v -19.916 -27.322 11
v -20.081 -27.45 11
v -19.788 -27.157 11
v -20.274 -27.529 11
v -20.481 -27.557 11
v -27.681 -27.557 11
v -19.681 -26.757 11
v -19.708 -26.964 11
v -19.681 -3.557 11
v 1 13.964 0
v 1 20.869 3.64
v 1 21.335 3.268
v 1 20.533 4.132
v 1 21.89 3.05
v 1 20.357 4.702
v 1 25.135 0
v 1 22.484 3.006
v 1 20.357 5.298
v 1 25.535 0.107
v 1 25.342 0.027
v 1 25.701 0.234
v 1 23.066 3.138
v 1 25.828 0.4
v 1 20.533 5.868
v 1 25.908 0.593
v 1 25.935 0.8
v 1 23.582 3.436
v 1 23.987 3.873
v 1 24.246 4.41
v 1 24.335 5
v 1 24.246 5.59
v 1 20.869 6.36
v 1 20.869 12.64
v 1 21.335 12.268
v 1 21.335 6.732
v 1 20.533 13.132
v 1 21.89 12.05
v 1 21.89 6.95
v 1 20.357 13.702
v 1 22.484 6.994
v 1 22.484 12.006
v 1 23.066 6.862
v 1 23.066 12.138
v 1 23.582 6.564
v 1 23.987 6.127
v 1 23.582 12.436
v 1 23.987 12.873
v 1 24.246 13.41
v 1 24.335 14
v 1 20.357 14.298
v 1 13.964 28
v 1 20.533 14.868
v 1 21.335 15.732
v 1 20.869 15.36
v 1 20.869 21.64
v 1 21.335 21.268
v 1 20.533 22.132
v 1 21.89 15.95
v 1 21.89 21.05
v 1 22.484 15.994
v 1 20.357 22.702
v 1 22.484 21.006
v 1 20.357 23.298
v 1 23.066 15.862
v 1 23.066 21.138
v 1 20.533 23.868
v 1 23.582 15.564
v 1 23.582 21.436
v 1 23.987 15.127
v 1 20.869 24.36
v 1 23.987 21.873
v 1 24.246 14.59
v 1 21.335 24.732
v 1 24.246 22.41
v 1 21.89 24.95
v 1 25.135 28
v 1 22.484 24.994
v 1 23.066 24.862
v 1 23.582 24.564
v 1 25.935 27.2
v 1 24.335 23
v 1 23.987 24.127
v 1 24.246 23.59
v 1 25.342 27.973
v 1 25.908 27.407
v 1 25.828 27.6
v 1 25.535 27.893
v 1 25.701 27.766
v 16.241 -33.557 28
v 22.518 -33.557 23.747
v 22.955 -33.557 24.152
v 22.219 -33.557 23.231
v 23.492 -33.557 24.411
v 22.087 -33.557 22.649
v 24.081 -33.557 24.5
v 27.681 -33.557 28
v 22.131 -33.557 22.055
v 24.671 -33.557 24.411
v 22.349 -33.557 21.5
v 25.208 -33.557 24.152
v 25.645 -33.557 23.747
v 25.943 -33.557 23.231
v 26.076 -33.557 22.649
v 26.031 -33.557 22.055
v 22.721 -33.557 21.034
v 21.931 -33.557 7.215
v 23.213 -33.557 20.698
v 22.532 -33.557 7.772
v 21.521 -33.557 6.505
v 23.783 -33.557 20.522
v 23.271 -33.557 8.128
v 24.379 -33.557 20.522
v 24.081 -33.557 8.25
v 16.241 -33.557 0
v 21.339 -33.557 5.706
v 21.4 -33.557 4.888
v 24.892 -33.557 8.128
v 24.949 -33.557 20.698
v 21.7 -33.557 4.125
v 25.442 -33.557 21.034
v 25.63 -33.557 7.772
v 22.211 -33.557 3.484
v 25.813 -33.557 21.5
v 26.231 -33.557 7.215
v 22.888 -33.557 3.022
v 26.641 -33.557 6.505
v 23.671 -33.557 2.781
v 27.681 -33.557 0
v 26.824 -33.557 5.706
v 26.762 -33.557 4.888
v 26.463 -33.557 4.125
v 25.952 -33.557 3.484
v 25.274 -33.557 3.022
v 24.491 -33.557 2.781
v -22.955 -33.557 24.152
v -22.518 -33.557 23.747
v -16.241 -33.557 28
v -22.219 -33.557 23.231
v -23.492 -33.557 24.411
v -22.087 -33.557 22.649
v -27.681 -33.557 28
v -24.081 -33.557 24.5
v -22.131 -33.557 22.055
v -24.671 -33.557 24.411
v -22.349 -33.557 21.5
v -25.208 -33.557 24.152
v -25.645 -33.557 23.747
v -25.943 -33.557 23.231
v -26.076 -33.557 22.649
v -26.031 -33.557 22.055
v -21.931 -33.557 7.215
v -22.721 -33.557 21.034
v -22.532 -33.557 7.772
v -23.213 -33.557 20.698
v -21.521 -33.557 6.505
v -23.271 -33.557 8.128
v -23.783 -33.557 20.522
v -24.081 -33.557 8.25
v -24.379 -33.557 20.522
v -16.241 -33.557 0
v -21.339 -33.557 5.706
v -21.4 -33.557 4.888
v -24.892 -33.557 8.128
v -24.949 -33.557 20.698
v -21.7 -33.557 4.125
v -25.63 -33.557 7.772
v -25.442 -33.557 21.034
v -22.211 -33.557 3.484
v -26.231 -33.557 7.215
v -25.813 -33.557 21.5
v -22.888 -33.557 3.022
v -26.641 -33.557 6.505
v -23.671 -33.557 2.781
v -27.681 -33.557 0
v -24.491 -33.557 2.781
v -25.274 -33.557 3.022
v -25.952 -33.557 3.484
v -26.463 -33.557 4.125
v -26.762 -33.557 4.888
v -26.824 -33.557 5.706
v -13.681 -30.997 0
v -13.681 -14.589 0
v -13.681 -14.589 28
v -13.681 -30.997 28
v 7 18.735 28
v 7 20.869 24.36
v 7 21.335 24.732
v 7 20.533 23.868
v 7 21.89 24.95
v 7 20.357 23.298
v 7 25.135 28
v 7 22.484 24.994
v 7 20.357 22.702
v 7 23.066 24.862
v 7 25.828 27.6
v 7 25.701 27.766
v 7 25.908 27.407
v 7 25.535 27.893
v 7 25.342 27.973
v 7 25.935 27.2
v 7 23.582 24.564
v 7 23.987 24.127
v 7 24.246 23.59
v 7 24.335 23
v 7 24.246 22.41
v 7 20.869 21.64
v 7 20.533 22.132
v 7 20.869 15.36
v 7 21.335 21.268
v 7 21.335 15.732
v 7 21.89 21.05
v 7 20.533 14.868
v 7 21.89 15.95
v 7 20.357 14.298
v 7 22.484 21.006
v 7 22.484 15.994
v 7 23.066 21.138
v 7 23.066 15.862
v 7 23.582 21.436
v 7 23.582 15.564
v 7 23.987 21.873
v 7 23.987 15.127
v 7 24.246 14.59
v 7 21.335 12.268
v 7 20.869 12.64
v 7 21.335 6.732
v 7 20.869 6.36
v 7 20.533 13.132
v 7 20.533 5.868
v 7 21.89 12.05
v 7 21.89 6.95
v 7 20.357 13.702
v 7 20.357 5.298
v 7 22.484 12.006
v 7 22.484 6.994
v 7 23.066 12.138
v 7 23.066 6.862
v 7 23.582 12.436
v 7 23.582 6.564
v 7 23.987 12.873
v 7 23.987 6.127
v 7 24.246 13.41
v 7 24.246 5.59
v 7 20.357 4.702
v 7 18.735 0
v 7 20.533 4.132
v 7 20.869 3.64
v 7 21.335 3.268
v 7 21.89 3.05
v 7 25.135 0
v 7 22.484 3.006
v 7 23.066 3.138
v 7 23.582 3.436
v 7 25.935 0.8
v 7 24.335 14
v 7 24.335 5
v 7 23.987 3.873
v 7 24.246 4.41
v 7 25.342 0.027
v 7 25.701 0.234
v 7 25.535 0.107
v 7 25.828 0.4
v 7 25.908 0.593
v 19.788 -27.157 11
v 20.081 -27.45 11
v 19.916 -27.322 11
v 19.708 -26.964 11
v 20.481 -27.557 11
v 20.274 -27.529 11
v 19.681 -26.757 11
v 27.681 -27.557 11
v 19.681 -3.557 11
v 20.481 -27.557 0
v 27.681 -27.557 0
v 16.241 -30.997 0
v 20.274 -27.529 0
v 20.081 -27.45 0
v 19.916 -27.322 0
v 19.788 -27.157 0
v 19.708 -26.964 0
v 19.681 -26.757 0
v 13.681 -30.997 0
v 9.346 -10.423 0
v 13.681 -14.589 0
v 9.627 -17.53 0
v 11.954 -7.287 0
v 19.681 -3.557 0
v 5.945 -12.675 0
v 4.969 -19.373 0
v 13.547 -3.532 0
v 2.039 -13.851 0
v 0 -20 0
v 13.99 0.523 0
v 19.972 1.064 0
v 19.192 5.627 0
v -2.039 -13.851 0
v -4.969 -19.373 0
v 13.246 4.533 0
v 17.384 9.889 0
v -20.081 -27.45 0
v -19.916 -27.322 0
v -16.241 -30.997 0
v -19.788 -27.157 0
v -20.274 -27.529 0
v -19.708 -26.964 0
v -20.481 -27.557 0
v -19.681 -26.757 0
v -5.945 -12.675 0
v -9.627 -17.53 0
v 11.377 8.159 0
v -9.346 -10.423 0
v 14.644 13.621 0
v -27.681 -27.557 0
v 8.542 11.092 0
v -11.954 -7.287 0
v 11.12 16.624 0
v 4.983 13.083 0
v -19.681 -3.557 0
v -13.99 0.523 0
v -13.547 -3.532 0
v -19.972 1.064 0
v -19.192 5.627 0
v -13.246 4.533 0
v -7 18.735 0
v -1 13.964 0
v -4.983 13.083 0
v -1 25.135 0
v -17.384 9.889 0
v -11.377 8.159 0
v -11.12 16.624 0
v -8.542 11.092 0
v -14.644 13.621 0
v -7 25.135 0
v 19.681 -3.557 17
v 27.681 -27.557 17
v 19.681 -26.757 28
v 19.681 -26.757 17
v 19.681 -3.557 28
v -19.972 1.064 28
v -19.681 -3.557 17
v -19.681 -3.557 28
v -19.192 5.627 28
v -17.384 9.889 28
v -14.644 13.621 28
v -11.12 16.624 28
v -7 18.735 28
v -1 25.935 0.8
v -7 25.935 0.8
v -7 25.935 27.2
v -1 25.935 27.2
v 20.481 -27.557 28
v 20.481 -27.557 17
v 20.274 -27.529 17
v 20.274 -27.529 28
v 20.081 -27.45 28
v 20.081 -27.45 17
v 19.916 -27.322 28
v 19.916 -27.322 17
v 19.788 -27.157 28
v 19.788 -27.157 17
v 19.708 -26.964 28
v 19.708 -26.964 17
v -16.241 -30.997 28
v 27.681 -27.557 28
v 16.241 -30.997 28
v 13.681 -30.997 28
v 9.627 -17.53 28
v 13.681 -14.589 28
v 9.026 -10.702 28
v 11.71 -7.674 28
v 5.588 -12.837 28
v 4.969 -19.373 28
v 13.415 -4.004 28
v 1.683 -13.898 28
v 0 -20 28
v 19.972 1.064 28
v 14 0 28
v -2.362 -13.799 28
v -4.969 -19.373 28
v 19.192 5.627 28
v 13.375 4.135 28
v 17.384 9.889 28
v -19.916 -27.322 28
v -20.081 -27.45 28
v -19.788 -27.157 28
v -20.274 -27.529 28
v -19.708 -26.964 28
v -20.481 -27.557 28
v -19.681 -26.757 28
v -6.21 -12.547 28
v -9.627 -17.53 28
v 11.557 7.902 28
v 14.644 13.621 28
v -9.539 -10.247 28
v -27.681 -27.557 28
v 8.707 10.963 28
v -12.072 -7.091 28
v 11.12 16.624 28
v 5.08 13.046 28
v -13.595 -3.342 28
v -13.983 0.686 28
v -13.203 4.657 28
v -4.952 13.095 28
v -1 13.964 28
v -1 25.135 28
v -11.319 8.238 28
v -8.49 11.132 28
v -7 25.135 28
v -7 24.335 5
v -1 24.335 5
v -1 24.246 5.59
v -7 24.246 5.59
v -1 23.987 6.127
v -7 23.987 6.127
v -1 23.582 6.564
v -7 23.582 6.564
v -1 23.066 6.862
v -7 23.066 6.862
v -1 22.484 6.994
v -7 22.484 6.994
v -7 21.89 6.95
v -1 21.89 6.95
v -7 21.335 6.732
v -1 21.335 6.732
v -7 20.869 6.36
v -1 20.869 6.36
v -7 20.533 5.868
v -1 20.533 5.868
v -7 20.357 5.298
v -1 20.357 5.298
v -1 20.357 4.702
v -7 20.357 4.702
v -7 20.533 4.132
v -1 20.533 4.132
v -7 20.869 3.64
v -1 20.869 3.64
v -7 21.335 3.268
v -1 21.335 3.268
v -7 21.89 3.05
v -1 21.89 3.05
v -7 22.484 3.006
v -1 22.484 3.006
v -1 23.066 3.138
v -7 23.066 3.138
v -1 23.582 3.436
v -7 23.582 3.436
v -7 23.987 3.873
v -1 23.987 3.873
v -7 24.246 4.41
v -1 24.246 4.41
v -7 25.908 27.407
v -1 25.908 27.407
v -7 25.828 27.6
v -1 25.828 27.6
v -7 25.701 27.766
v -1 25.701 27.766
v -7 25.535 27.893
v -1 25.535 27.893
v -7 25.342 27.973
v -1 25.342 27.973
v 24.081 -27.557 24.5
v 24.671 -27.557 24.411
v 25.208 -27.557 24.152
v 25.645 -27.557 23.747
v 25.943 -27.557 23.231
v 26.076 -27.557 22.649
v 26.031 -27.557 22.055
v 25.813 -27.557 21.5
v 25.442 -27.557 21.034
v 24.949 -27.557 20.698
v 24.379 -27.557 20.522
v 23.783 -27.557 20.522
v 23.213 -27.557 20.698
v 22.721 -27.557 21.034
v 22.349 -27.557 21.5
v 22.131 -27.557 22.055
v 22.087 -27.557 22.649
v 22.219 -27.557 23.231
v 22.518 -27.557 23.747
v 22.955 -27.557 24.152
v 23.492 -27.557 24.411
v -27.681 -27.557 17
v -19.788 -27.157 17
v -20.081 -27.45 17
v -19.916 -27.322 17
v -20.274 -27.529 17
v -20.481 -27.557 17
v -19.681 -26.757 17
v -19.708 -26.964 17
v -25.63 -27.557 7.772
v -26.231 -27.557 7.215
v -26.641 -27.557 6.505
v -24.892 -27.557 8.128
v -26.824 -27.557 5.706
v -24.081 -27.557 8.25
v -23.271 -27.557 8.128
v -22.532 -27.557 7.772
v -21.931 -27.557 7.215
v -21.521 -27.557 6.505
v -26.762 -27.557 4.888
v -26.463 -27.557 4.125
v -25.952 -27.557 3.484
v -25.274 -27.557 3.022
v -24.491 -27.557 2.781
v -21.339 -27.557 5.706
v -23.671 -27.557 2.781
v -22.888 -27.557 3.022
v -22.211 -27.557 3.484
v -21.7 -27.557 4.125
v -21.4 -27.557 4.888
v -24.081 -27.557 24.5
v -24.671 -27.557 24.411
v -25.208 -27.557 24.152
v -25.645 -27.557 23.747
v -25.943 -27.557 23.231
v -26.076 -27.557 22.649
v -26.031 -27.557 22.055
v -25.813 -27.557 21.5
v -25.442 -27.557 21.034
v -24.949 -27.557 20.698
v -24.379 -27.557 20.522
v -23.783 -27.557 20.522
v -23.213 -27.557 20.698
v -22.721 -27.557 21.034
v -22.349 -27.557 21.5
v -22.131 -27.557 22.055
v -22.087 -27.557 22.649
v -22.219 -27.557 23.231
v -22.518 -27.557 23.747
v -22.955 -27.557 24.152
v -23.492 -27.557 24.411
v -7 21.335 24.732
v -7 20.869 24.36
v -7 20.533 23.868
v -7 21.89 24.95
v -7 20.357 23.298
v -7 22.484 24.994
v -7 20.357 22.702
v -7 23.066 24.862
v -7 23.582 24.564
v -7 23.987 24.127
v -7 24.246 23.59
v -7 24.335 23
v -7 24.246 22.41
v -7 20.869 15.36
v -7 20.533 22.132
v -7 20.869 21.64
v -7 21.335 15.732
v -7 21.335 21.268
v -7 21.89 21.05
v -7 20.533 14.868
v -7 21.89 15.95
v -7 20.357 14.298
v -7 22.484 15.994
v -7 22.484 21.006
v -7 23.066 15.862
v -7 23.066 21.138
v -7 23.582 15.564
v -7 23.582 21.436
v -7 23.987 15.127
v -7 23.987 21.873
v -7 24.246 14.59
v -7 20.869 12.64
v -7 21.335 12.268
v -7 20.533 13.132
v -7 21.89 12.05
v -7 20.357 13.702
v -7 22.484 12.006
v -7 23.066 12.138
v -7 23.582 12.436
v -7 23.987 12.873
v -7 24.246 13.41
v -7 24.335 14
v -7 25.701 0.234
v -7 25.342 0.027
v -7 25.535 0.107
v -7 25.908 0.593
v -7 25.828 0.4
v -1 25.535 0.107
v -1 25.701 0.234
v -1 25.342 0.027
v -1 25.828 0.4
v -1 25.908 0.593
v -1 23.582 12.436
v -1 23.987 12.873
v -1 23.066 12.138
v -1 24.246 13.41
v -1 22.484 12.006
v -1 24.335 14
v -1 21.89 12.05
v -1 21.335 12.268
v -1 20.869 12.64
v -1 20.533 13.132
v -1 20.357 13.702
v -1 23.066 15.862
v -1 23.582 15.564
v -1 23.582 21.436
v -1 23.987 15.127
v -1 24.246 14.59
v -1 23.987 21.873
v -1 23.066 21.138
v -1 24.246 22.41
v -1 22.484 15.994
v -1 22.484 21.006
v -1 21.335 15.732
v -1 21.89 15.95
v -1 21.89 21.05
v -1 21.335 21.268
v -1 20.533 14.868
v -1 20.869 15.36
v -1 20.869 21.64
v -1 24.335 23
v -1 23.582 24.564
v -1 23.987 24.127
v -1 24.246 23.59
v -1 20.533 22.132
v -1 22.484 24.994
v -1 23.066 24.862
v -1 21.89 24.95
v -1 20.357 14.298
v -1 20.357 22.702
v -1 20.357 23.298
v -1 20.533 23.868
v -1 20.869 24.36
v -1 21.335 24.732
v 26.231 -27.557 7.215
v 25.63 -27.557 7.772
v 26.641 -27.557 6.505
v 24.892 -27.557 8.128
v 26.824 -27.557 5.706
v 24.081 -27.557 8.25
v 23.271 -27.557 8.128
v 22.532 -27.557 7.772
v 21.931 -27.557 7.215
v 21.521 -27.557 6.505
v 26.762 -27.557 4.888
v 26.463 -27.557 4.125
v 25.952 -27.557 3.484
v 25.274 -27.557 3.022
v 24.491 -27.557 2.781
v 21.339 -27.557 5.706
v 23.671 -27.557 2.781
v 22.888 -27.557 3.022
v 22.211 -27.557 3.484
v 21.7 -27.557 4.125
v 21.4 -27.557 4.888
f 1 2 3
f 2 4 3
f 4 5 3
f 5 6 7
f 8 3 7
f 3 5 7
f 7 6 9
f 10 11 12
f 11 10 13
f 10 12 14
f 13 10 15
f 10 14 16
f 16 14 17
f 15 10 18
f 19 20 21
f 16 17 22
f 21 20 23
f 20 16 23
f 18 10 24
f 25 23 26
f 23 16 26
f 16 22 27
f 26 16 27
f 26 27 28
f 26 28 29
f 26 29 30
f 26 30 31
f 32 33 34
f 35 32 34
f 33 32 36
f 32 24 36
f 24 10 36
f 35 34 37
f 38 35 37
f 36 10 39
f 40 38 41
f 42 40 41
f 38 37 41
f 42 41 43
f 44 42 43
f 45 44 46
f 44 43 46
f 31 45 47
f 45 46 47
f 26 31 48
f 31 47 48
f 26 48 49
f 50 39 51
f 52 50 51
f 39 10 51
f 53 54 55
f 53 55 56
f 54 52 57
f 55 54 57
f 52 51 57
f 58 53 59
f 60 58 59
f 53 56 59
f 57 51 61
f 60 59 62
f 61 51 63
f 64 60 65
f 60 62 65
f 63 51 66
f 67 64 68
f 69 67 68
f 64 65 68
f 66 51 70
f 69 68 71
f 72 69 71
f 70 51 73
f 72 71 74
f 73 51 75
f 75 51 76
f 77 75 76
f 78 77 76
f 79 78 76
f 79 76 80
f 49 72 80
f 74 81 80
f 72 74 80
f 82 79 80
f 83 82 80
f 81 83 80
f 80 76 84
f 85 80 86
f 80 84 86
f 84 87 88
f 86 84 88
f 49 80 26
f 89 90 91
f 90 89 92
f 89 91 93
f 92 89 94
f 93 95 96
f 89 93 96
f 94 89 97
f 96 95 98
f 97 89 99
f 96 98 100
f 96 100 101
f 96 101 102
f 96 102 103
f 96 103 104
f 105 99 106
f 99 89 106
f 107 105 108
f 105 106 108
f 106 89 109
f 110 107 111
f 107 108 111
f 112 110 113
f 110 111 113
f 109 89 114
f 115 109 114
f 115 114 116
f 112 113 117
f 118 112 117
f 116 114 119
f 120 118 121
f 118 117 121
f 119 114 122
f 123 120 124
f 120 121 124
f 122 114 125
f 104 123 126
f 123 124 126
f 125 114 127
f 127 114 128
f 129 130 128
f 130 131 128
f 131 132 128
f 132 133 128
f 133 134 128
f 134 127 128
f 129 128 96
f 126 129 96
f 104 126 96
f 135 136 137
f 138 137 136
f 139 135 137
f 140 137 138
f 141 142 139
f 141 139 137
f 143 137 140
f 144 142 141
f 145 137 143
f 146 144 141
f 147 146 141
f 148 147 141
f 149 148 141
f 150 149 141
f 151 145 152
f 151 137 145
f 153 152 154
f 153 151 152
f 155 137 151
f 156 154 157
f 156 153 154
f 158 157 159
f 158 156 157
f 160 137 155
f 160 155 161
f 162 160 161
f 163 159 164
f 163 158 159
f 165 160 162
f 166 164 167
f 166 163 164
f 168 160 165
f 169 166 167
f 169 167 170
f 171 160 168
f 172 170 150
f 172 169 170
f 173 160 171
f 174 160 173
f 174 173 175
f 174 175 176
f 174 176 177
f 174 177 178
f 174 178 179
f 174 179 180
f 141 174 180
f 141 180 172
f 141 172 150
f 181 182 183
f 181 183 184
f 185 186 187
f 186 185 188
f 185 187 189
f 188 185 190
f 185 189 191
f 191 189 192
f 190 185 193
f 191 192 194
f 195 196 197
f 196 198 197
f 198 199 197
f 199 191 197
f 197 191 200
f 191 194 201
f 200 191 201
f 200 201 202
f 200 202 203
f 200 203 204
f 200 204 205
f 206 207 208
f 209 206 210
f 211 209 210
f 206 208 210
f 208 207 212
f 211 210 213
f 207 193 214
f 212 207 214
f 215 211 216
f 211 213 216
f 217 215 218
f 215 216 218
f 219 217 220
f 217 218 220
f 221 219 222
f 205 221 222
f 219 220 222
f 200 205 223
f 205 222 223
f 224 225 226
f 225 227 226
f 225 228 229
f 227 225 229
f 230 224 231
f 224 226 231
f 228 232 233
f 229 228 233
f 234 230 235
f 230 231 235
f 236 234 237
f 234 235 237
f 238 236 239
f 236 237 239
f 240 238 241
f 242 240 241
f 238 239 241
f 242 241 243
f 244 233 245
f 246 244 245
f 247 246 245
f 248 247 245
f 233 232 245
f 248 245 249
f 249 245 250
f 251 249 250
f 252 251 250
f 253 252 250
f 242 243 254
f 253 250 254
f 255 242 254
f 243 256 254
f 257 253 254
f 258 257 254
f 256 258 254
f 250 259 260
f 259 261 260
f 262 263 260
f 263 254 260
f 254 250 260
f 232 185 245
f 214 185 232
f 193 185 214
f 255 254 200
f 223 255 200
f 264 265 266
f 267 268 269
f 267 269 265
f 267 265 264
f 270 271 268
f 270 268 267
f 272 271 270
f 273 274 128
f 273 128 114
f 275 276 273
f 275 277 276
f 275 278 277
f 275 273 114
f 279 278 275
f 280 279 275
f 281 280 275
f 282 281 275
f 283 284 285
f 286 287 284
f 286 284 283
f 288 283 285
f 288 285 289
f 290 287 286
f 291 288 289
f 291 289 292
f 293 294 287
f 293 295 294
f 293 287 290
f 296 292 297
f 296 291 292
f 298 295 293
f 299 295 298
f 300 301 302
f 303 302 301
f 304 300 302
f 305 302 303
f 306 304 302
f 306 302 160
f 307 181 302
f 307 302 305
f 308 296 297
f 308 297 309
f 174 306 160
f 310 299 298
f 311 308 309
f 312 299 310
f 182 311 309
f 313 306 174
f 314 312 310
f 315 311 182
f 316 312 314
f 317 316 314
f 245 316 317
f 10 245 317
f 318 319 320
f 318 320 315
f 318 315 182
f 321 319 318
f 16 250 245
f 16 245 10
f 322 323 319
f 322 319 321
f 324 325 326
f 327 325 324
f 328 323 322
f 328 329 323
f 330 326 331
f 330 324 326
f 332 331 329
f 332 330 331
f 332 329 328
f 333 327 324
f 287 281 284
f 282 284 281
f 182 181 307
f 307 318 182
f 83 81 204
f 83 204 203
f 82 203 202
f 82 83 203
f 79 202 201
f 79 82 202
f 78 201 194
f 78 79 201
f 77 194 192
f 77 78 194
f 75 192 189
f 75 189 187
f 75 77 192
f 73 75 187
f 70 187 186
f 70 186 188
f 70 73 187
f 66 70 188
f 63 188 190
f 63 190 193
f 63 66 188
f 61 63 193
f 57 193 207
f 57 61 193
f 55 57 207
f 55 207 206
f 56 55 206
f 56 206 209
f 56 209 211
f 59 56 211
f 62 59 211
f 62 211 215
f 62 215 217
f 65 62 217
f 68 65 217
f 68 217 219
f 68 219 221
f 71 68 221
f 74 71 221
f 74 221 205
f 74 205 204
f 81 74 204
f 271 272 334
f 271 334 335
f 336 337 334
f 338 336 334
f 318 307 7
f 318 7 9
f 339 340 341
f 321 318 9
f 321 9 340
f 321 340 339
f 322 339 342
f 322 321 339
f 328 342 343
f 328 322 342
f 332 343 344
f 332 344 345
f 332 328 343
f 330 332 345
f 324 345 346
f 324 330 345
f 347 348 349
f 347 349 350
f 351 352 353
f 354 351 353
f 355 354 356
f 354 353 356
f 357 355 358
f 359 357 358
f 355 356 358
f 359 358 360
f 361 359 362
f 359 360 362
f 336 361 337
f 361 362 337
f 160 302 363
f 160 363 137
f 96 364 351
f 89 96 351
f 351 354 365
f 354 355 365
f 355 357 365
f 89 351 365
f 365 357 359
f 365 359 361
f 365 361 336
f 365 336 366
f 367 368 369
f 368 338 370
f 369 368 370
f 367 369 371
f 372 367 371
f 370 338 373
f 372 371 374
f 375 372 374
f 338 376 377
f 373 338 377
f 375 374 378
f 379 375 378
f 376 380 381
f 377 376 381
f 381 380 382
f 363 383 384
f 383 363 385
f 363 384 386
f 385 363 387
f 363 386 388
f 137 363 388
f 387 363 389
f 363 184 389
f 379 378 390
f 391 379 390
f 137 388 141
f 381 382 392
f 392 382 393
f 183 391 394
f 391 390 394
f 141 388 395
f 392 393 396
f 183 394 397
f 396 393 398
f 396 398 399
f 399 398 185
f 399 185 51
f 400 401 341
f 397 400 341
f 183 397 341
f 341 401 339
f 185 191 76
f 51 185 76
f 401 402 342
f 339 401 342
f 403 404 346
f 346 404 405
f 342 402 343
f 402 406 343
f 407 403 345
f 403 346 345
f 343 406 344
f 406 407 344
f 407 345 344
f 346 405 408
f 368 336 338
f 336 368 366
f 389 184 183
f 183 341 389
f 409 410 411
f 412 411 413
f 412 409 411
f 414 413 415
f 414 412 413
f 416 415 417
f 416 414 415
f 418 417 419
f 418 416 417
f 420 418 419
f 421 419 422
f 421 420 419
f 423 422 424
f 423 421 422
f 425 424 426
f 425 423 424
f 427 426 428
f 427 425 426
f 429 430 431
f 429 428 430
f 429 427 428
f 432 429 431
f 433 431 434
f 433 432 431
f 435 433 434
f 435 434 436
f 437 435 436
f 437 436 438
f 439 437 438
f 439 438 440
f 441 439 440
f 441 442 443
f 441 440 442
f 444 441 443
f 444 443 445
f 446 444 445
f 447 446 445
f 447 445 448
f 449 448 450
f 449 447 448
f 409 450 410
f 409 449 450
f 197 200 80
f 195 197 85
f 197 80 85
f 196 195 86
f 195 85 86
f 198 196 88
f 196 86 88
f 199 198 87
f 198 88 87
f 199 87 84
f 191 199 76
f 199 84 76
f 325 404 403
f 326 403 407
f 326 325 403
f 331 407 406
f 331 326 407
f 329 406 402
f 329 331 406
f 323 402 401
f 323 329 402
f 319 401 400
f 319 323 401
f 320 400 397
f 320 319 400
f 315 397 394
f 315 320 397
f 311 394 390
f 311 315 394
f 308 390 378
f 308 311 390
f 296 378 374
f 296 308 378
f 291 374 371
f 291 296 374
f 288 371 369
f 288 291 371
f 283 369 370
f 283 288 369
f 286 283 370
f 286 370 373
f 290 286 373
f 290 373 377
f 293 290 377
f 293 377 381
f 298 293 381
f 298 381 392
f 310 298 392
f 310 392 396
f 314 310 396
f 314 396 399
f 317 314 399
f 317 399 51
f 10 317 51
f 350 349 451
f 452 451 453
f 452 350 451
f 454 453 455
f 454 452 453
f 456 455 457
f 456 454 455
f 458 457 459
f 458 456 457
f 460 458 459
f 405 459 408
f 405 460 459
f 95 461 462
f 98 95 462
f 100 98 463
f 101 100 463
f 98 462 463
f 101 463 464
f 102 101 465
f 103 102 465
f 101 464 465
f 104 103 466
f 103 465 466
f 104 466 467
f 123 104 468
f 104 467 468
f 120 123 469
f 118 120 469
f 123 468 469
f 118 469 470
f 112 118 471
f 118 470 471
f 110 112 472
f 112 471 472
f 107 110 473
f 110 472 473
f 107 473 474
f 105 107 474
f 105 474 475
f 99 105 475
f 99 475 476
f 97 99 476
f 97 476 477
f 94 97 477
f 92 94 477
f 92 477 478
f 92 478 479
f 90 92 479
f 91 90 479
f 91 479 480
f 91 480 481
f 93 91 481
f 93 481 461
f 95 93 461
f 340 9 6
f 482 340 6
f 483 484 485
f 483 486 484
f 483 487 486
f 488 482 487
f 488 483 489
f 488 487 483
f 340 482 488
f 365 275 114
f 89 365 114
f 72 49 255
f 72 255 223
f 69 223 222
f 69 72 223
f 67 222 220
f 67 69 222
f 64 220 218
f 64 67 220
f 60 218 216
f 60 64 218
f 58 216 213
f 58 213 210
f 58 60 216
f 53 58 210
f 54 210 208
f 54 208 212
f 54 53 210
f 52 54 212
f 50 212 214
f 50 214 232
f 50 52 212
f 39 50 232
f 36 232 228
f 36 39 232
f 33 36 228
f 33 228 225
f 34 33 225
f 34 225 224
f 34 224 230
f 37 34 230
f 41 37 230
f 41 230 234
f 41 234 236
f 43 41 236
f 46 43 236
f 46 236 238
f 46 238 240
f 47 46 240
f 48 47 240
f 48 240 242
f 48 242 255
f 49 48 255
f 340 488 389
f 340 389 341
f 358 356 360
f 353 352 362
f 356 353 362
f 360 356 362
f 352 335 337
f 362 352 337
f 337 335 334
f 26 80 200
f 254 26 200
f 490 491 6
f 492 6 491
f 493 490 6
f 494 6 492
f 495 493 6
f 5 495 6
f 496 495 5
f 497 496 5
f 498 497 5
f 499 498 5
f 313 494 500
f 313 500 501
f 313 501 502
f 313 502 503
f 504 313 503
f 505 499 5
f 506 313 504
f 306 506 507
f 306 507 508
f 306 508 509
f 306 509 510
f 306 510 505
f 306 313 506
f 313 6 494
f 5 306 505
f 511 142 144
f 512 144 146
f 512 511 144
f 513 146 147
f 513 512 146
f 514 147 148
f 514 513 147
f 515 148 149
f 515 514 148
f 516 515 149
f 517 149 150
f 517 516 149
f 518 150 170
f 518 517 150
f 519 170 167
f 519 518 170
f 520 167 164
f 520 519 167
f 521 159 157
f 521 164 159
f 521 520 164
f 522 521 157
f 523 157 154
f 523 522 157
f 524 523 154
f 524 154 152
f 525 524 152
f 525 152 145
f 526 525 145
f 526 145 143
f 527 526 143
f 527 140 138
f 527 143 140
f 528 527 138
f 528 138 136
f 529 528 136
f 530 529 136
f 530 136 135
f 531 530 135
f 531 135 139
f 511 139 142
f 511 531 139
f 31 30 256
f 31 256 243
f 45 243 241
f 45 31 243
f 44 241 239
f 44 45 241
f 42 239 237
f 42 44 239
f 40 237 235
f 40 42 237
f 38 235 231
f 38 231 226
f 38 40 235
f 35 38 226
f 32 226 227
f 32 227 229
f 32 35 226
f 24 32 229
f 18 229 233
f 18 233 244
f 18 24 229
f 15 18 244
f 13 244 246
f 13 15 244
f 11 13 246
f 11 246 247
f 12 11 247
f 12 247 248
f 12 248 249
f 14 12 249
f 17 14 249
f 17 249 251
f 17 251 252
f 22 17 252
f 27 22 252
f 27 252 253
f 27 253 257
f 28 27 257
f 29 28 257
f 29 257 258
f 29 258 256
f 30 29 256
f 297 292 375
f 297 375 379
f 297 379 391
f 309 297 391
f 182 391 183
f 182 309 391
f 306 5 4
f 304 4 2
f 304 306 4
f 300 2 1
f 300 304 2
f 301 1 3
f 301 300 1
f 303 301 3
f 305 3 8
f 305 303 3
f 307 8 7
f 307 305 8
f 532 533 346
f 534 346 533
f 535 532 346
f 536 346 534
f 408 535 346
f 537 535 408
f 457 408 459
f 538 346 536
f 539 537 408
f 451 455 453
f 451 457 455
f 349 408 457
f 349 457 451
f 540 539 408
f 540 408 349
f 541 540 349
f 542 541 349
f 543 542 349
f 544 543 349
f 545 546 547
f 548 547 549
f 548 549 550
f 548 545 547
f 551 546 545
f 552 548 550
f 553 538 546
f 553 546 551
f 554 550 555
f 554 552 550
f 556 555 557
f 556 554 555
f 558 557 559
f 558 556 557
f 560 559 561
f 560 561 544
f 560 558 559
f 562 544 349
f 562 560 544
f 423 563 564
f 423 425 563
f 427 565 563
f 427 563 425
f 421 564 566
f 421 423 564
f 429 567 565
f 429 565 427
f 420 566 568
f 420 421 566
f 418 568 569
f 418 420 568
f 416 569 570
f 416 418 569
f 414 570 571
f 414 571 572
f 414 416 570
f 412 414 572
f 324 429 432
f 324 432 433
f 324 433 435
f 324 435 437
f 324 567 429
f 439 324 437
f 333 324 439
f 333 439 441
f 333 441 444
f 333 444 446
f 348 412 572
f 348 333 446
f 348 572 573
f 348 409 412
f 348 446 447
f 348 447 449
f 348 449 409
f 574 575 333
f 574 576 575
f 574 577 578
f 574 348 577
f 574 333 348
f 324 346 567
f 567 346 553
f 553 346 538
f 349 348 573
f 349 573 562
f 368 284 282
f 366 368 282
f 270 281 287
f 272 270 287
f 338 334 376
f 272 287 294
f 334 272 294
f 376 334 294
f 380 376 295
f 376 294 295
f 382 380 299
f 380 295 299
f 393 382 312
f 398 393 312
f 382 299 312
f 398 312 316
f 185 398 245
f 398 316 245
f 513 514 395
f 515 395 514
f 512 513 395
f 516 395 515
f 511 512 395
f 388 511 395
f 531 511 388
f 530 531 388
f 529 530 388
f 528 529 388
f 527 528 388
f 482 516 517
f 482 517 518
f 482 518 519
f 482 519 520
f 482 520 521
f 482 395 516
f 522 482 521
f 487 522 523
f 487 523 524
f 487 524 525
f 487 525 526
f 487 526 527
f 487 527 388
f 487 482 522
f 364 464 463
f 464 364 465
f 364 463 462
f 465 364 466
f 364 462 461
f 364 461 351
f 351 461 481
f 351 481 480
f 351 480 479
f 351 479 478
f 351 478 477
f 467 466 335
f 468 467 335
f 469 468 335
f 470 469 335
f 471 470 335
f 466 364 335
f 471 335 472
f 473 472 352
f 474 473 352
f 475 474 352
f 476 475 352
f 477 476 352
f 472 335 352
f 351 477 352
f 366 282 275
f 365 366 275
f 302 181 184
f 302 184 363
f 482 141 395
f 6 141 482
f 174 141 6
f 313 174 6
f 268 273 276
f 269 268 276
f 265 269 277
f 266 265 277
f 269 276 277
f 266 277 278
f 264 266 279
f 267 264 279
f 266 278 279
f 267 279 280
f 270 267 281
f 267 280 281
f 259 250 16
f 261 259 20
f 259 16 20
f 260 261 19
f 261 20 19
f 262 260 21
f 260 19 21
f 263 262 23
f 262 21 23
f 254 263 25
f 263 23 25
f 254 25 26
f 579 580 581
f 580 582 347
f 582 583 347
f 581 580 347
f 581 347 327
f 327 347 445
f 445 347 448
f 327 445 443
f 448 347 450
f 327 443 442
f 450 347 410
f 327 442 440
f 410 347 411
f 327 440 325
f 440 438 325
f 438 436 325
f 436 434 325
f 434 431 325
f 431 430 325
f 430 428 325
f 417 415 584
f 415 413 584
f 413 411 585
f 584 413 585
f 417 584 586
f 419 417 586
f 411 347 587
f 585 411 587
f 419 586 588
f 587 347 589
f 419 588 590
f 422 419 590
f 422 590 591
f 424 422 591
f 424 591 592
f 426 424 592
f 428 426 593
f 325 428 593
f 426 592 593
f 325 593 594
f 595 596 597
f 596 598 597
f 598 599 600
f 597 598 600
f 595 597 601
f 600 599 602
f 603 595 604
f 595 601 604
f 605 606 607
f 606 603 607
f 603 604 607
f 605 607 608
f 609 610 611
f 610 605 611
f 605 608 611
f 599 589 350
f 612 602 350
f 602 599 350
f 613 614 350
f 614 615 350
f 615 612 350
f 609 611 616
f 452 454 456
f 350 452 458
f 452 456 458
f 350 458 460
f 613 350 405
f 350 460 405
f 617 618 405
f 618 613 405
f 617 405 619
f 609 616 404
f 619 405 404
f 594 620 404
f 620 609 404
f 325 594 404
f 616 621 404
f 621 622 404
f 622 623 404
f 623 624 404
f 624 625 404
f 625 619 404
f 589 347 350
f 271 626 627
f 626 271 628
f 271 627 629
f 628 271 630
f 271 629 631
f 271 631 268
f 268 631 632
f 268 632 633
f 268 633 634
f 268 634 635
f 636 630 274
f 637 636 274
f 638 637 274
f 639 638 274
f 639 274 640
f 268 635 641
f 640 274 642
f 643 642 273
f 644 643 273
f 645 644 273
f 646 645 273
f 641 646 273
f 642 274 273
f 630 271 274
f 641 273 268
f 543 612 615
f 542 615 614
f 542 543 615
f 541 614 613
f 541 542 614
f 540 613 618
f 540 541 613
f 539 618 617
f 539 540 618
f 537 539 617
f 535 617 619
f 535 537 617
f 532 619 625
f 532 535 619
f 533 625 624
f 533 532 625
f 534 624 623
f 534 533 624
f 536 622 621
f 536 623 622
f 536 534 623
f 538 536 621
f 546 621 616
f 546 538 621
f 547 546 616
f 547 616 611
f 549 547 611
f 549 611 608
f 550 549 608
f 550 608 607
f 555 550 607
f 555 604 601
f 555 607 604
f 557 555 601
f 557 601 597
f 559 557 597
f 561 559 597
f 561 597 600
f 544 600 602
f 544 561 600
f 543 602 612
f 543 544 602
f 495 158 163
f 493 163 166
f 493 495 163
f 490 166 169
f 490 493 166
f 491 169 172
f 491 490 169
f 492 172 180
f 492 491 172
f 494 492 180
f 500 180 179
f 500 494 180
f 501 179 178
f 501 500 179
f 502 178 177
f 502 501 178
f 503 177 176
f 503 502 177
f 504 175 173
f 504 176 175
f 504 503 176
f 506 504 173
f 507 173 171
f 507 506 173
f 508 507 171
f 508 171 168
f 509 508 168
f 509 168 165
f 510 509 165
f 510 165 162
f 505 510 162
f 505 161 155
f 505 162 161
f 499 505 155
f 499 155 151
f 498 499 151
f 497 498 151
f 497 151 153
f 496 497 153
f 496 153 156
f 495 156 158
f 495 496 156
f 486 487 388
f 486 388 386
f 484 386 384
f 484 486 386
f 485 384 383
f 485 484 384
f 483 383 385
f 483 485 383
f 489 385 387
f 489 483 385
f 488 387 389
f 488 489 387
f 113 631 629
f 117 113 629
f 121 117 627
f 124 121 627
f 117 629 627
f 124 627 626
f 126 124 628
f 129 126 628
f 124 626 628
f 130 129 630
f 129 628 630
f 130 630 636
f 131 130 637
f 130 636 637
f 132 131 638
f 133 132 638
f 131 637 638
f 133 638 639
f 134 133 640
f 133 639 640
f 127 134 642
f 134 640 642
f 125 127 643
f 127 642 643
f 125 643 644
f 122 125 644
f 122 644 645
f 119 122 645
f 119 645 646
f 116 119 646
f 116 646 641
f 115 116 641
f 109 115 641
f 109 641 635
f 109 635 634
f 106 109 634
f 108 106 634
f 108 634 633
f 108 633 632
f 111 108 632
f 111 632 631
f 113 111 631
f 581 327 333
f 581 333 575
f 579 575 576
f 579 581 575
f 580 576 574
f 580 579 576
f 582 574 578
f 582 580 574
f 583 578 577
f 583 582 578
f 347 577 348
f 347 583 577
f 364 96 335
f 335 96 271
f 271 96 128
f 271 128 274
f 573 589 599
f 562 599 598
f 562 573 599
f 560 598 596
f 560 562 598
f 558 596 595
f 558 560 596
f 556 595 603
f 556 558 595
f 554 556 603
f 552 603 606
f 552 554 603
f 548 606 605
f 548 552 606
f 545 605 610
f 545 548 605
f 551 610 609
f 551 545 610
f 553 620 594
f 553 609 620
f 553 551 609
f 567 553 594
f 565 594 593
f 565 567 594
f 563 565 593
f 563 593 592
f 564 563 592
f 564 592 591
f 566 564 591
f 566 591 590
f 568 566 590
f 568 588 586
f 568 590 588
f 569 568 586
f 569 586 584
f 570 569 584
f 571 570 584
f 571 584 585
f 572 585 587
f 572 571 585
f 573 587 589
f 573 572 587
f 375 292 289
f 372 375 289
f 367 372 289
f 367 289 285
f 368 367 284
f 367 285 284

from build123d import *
from build123d.topology import SkipClean

# Parameters (mm, degrees)
BOSS_EXTRUDE1_DEPTH  = 28
BOSS_EXTRUDE2_START  = 11
BOSS_EXTRUDE2_DEPTH  = 6
CUT_EXTRUDE1_REACH   = 50.35
SKETCH3_R            = 2
FILLET1_R            = 0.8
SKETCH4_R            = 2
SKETCH4_R_2          = 2.75
CUT_EXTRUDE2_DEPTH   = 67.419950062
FILLET1_OF_MIRROR1_R = 0.8
CUT_EXTRUDE3_DEPTH   = 52.732976543


with BuildPart() as part:
    # Sketch1 → Boss-Extrude1 (new body)
    with BuildSketch(Plane.XY):
        with BuildLine():
            Line((0, 20), (0, 14))
            ThreePointArc((0, 14), (14, 0), (0, -14))
            Line((0, -14), (0, -20))
            ThreePointArc((0, -20), (7.356284672, -18.5979858), (13.681207787, -14.588507583))
            Line((13.681207787, -14.588507583), (13.681207787, -30.99669229))
            Line((13.681207787, -30.99669229), (16.241207787, -30.99669229))
            Line((16.241207787, -30.99669229), (16.241207787, -33.55669229))
            Line((16.241207787, -33.55669229), (27.681207787, -33.55669229))
            Line((27.681207787, -33.55669229), (27.681207787, -27.55669229))
            Line((27.681207787, -27.55669229), (20.481207787, -27.55669229))
            ThreePointArc((20.481207787, -27.55669229), (19.915522362, -27.322377715), (19.681207787, -26.75669229))
            Line((19.681207787, -26.75669229), (19.681207787, -3.55669229))
            ThreePointArc((19.681207787, -3.55669229), (17.38394465, 9.889310815), (7, 18.734993995))
            Line((7, 18.734993995), (7, 25.934993995))
            Line((7, 25.934993995), (0, 25.934993995))
            Line((0, 25.934993995), (0, 20))
        make_face()
    boss_extrude1 = extrude(amount=BOSS_EXTRUDE1_DEPTH)

    # Sketch2 → Boss-Extrude2 (add)
    with BuildSketch(Plane.XY.offset(BOSS_EXTRUDE2_START)):
        Polygon((19.681207787, -26.75669229), (19.681207787, -3.55669229), (27.681207787, -27.55669229), (20.481207787, -27.55669229), (19.681207787, -27.55669229), align=None)
    boss_extrude2 = extrude(amount=BOSS_EXTRUDE2_DEPTH)

    # Sketch3 → Cut-Extrude1 (cut, up to next)
    with BuildSketch(Plane(origin=(7, 0, 0), x_dir=(0, 0, -1), z_dir=(1, 0, 0)), mode=Mode.PRIVATE) as cut_extrude1_sk1:
        with Locations(Location((-23, 22.334993995, 0), (0, 0, 90))):
            Circle(SKETCH3_R)
    cut_extrude1_tool1 = extrude(cut_extrude1_sk1.sketch, amount=-CUT_EXTRUDE1_REACH, mode=Mode.PRIVATE) & part.part
    # Sketch3 → Cut-Extrude1 (cut, up to next)
    with BuildSketch(Plane(origin=(7, 0, 0), x_dir=(0, 0, -1), z_dir=(1, 0, 0)), mode=Mode.PRIVATE) as cut_extrude1_sk2:
        with Locations(Location((-14, 22.334993995, 0), (0, 0, 90))):
            Circle(SKETCH3_R)
    cut_extrude1_tool2 = extrude(cut_extrude1_sk2.sketch, amount=-CUT_EXTRUDE1_REACH, mode=Mode.PRIVATE) & part.part
    # Sketch3 → Cut-Extrude1 (cut, up to next)
    with BuildSketch(Plane(origin=(7, 0, 0), x_dir=(0, 0, -1), z_dir=(1, 0, 0)), mode=Mode.PRIVATE) as cut_extrude1_sk3:
        with Locations(Location((-5, 22.334993995, 0), (0, 0, 90))):
            Circle(SKETCH3_R)
    cut_extrude1_tool3 = extrude(cut_extrude1_sk3.sketch, amount=-CUT_EXTRUDE1_REACH, mode=Mode.PRIVATE) & part.part
    cut_extrude1_1 = cut_extrude1_tool1.solids().sort_by_distance((7, 22.334994, 23))[0]
    add(cut_extrude1_1, mode=Mode.SUBTRACT)
    cut_extrude1_2 = cut_extrude1_tool2.solids().sort_by_distance((7, 22.334994, 14))[0]
    add(cut_extrude1_2, mode=Mode.SUBTRACT)
    cut_extrude1_3 = cut_extrude1_tool3.solids().sort_by_distance((7, 22.334994, 5))[0]
    add(cut_extrude1_3, mode=Mode.SUBTRACT)
    cut_extrude1 = cut_extrude1_1 + cut_extrude1_2 + cut_extrude1_3  # Cut-Extrude1 as one shape, for the pattern or mirror that repeats it

    # Fillet1
    fillet1_edges = [part.edges().sort_by_distance(p)[0] for p in [
        (3.5, 25.934993995, 0),
        (3.5, 25.934993995, 28),
    ]]
    fillet(fillet1_edges, radius=FILLET1_R)

    # Sketch4 → Cut-Extrude2 (cut, through all)
    with BuildSketch(Plane(origin=(0, -27.55669229, 0), x_dir=(1, 0, 0), z_dir=(0, 1, 0))):
        with Locations(Location((24.081207787, -22.5, 0), (0, 0, 270))):
            Circle(SKETCH4_R)
        with Locations(Location((24.081207787, -5.5, 0), (0, 0, 270))):
            Circle(SKETCH4_R_2)
    cut_extrude2 = extrude(amount=-CUT_EXTRUDE2_DEPTH, mode=Mode.SUBTRACT)

    # Mirror1: Boss-Extrude1, Boss-Extrude2, Cut-Extrude1, Cut-Extrude2 across plane
    with SkipClean():  # the faces are left unmerged after this step: merging them gives an invalid solid
        add(boss_extrude1.mirror(Plane(origin=(0, 0, 0), x_dir=(0, 0, 1), z_dir=(1, 0, 0))))
        add(boss_extrude2.mirror(Plane(origin=(0, 0, 0), x_dir=(0, 0, 1), z_dir=(1, 0, 0))))
        add(cut_extrude1.mirror(Plane(origin=(0, 0, 0), x_dir=(0, 0, 1), z_dir=(1, 0, 0))), mode=Mode.SUBTRACT)
        add(cut_extrude2.mirror(Plane(origin=(0, 0, 0), x_dir=(0, 0, 1), z_dir=(1, 0, 0))), mode=Mode.SUBTRACT)

    # Fillet1 of Mirror1
    fillet1_of_mirror1_edges = [part.edges().sort_by_distance(p)[0] for p in [
        (-3.5, 25.934993995, 0),
        (-3.5, 25.934993995, 28),
    ]]
    fillet(fillet1_of_mirror1_edges, radius=FILLET1_OF_MIRROR1_R)

    # Sketch6 → Cut-Extrude3 (cut, through all)
    with BuildSketch(Plane.XY.offset(28)):
        with BuildLine():
            ThreePointArc((1, 13.964240044), (0, 14), (-1, 13.964240044))
            Line((-1, 13.964240044), (-1, 8.456424639))
            Line((-1, 8.456424639), (1, 8.456424639))
            Line((1, 8.456424639), (1, 13.964240044))
        make_face()
        with BuildLine():
            Line((-1, 8.456424639), (-1, 13.964240044))
            ThreePointArc((-1, 13.964240044), (-9.539392014, -10.246950766), (14, 0))
            ThreePointArc((14, 0), (10.246950766, 9.539392014), (1, 13.964240044))
            Line((1, 13.964240044), (1, 8.456424639))
            Line((1, 8.456424639), (-1, 8.456424639))
        make_face()
        with BuildLine():
            Line((0, 25.134993995), (-1, 25.134993995))
            Line((-1, 25.134993995), (-1, 13.964240044))
            ThreePointArc((-1, 13.964240044), (0, 14), (1, 13.964240044))
            Line((1, 13.964240044), (1, 25.134993995))
            Line((1, 25.134993995), (0, 25.134993995))
        make_face()
        Polygon((1, 41.813563352), (-1, 41.813563352), (-1, 25.134993995), (0, 25.134993995), (1, 25.134993995), align=None)
    extrude(amount=-CUT_EXTRUDE3_DEPTH, mode=Mode.SUBTRACT)


solid = part.part
